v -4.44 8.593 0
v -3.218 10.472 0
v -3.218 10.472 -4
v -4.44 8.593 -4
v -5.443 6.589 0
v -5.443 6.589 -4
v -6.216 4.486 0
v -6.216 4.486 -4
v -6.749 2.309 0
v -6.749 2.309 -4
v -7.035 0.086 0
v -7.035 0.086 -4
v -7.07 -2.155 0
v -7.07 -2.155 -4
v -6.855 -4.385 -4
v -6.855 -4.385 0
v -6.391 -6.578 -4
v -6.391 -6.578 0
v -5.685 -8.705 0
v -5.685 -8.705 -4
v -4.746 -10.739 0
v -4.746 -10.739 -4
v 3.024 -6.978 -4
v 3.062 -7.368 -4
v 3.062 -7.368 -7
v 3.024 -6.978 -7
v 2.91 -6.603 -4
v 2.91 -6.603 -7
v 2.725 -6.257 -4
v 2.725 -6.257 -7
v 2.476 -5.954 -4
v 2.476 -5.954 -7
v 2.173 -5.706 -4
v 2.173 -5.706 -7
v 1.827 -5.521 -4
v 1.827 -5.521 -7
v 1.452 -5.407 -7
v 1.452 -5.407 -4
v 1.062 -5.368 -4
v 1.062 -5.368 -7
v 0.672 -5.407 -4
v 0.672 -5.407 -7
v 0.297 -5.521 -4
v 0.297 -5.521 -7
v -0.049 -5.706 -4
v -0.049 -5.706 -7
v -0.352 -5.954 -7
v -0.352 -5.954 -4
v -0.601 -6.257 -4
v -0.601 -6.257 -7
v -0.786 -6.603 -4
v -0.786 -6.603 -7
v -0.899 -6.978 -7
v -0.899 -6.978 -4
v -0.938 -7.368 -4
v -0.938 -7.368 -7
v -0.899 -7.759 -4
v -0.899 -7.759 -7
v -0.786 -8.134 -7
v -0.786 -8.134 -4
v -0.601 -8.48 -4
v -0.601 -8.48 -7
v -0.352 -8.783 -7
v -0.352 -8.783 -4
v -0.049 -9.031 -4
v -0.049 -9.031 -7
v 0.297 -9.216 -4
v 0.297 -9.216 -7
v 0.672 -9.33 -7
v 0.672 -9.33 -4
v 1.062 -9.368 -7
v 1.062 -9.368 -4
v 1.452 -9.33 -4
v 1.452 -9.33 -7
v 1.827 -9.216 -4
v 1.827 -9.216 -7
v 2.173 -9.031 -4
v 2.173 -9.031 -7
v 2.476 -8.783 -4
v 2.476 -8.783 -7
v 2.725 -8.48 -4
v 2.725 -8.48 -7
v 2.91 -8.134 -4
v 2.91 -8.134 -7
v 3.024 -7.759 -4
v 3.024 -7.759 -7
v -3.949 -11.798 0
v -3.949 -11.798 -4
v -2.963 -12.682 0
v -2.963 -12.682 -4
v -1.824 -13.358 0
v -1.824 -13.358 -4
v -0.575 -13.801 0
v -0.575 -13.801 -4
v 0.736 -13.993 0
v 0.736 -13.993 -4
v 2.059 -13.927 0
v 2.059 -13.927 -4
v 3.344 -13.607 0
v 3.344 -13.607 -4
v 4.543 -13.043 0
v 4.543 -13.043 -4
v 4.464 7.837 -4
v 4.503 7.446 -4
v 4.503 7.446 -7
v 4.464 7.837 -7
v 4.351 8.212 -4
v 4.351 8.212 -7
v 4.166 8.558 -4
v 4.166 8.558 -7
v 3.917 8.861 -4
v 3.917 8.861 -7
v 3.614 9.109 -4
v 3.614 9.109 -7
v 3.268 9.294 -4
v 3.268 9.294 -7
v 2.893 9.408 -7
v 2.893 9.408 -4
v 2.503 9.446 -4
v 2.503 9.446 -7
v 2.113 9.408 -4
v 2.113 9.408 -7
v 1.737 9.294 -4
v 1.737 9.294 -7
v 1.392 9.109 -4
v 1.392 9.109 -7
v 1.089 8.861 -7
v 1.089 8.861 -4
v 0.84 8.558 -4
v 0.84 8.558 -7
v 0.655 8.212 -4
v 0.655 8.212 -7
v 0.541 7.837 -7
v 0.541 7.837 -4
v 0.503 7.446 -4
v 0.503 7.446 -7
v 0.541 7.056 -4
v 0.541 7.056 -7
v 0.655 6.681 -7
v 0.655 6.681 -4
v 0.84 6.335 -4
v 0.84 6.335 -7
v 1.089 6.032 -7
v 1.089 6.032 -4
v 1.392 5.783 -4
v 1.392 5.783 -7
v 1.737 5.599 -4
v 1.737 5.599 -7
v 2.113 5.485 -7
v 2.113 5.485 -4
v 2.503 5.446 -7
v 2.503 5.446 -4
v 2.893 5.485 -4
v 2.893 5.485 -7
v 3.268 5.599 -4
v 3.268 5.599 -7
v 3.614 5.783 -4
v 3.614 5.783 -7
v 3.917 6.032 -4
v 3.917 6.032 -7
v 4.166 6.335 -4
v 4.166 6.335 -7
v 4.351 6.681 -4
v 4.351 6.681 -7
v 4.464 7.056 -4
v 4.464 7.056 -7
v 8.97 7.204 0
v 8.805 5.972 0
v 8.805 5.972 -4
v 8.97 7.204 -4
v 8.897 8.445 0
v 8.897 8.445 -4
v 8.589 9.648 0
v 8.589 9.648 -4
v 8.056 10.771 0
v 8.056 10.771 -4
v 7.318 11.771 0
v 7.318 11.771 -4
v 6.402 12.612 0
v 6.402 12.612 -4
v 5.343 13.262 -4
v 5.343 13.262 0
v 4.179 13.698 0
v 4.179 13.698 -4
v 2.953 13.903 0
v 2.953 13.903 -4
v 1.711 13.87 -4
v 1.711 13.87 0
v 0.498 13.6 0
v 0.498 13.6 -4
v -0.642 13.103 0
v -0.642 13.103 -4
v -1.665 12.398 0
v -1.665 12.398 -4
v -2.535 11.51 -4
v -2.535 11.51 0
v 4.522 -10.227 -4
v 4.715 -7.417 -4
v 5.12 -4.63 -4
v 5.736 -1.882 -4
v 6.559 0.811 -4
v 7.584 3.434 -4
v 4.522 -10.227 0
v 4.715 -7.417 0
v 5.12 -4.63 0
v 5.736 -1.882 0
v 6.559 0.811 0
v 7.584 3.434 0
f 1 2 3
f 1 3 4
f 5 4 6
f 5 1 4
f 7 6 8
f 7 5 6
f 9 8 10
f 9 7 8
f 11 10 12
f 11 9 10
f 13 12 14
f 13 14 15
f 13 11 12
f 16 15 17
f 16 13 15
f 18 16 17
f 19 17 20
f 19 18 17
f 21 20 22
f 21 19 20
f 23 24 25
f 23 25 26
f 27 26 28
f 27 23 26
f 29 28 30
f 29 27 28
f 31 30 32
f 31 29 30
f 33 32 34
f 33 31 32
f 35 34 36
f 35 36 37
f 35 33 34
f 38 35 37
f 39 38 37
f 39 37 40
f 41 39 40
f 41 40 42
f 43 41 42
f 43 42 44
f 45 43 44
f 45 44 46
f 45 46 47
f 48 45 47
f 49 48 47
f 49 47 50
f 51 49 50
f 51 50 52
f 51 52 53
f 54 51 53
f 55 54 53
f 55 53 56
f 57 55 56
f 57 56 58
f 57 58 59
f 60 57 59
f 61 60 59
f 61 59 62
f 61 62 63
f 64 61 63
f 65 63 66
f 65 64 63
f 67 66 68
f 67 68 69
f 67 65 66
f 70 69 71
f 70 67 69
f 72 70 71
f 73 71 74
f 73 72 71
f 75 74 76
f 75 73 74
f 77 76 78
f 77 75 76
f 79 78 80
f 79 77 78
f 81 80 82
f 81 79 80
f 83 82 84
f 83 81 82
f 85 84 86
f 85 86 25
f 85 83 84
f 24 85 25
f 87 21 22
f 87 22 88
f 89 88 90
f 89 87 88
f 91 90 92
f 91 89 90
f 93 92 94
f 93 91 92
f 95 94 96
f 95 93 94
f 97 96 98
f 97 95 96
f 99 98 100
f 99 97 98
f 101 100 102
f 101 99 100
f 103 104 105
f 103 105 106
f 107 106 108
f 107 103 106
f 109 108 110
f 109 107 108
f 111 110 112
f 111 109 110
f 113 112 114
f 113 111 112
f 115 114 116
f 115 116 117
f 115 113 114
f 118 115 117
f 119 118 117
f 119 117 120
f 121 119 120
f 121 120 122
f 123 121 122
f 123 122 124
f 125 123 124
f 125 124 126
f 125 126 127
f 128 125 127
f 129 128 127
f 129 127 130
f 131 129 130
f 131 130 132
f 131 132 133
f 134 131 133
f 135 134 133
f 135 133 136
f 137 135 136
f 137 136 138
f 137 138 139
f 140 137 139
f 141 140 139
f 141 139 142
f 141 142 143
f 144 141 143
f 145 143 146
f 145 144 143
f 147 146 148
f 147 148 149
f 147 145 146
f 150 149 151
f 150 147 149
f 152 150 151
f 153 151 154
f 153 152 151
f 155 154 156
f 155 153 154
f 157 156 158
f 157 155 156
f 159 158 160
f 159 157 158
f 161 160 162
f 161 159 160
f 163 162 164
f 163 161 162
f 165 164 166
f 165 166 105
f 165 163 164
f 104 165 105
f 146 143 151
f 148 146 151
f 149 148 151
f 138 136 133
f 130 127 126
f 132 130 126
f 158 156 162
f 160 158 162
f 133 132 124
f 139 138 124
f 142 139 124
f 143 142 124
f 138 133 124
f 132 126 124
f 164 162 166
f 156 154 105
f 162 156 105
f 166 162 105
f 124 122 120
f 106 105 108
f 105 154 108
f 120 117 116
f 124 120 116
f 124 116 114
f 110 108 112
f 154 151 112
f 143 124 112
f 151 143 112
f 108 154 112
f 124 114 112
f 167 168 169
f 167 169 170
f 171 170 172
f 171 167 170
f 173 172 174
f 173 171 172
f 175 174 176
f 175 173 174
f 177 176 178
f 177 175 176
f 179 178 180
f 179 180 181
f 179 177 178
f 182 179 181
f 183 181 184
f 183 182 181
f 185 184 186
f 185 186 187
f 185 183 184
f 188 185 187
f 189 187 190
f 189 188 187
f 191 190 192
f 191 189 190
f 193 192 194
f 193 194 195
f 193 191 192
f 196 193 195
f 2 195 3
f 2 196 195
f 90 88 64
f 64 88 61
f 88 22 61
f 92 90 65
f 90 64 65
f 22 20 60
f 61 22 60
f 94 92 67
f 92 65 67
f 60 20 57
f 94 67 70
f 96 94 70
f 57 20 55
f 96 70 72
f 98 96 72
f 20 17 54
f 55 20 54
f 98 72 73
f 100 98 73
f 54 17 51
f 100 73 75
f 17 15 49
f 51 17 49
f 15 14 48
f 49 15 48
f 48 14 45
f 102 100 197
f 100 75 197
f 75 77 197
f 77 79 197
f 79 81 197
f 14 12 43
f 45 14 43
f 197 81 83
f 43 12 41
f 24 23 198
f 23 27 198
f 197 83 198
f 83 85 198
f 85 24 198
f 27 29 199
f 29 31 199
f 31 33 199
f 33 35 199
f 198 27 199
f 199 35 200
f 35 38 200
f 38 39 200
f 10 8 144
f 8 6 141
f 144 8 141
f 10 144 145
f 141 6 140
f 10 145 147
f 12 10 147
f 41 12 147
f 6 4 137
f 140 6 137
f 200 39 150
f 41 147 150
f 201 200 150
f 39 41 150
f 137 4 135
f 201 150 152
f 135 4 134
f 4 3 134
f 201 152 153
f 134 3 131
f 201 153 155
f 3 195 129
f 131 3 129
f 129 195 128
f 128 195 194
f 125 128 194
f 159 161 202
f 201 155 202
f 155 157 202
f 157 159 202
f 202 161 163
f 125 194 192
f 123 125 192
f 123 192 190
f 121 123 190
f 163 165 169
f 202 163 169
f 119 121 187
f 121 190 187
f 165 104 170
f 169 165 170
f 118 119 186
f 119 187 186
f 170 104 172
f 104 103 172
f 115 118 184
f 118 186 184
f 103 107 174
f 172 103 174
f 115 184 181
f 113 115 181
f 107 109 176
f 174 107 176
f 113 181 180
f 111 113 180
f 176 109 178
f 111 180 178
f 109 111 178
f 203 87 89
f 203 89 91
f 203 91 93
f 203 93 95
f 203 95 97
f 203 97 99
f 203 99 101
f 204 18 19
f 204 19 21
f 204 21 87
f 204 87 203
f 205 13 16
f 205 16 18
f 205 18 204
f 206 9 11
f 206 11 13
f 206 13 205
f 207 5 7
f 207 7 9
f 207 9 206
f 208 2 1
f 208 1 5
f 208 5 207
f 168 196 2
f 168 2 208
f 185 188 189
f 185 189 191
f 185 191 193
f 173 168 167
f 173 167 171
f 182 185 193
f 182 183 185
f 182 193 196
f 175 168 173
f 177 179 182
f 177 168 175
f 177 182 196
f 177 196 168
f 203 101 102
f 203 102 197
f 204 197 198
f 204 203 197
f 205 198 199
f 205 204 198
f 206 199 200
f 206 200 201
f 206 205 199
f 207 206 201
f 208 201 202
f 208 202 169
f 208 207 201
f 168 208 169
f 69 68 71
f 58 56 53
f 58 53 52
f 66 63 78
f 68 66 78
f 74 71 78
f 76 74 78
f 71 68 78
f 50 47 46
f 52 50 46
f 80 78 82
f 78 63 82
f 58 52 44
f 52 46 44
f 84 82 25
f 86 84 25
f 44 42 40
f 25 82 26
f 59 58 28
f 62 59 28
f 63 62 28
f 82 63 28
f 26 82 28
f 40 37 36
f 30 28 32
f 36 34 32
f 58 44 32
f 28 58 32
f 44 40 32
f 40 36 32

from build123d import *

# Parameters (mm, degrees)
F0_R     = 2
F1_DEPTH = 4
F2_DEPTH = 7


# Not quite as in the source:
# - a feature names something its author has since deleted; it is built from what else it names


with BuildPart() as f1:
    # F0 (on Top) → F1 (new body)
    with BuildSketch(Plane.XY):
        with BuildLine():
            ThreePointArc((8.8045736775, 5.9720319696), (4.7714301194, 13.5077650507), (-3.2184339135, 10.47204557))
            ThreePointArc((-3.2184339135, 10.47204557), (-7.0349525259, 0.086158841), (-4.7456540833, -10.739346695))
            ThreePointArc((-4.7456540833, -10.739346695), (-0.5751322141, -13.8008387314), (4.5426217839, -13.0428280681))
            ThreePointArc((4.5426217839, -13.0428280681), (5.4021565515, -3.2504198201), (8.8045736775, 5.9720319696))
        make_face()
        with Locations((1.0620787063, -7.3684426025)):
            Circle(F0_R, mode=Mode.SUBTRACT)
        with Locations((2.5027735673, 7.4464333818)):
            Circle(F0_R, mode=Mode.SUBTRACT)
    extrude(amount=-F1_DEPTH)

    # F0 (on Top) → F2 (join)
    with BuildSketch(Plane.XY):
        with Locations((2.5027735673, 7.4464333818)):
            Circle(F0_R)
        with Locations((1.0620787063, -7.3684426025)):
            Circle(F0_R)
    extrude(amount=-F2_DEPTH)


solid = f1.part
